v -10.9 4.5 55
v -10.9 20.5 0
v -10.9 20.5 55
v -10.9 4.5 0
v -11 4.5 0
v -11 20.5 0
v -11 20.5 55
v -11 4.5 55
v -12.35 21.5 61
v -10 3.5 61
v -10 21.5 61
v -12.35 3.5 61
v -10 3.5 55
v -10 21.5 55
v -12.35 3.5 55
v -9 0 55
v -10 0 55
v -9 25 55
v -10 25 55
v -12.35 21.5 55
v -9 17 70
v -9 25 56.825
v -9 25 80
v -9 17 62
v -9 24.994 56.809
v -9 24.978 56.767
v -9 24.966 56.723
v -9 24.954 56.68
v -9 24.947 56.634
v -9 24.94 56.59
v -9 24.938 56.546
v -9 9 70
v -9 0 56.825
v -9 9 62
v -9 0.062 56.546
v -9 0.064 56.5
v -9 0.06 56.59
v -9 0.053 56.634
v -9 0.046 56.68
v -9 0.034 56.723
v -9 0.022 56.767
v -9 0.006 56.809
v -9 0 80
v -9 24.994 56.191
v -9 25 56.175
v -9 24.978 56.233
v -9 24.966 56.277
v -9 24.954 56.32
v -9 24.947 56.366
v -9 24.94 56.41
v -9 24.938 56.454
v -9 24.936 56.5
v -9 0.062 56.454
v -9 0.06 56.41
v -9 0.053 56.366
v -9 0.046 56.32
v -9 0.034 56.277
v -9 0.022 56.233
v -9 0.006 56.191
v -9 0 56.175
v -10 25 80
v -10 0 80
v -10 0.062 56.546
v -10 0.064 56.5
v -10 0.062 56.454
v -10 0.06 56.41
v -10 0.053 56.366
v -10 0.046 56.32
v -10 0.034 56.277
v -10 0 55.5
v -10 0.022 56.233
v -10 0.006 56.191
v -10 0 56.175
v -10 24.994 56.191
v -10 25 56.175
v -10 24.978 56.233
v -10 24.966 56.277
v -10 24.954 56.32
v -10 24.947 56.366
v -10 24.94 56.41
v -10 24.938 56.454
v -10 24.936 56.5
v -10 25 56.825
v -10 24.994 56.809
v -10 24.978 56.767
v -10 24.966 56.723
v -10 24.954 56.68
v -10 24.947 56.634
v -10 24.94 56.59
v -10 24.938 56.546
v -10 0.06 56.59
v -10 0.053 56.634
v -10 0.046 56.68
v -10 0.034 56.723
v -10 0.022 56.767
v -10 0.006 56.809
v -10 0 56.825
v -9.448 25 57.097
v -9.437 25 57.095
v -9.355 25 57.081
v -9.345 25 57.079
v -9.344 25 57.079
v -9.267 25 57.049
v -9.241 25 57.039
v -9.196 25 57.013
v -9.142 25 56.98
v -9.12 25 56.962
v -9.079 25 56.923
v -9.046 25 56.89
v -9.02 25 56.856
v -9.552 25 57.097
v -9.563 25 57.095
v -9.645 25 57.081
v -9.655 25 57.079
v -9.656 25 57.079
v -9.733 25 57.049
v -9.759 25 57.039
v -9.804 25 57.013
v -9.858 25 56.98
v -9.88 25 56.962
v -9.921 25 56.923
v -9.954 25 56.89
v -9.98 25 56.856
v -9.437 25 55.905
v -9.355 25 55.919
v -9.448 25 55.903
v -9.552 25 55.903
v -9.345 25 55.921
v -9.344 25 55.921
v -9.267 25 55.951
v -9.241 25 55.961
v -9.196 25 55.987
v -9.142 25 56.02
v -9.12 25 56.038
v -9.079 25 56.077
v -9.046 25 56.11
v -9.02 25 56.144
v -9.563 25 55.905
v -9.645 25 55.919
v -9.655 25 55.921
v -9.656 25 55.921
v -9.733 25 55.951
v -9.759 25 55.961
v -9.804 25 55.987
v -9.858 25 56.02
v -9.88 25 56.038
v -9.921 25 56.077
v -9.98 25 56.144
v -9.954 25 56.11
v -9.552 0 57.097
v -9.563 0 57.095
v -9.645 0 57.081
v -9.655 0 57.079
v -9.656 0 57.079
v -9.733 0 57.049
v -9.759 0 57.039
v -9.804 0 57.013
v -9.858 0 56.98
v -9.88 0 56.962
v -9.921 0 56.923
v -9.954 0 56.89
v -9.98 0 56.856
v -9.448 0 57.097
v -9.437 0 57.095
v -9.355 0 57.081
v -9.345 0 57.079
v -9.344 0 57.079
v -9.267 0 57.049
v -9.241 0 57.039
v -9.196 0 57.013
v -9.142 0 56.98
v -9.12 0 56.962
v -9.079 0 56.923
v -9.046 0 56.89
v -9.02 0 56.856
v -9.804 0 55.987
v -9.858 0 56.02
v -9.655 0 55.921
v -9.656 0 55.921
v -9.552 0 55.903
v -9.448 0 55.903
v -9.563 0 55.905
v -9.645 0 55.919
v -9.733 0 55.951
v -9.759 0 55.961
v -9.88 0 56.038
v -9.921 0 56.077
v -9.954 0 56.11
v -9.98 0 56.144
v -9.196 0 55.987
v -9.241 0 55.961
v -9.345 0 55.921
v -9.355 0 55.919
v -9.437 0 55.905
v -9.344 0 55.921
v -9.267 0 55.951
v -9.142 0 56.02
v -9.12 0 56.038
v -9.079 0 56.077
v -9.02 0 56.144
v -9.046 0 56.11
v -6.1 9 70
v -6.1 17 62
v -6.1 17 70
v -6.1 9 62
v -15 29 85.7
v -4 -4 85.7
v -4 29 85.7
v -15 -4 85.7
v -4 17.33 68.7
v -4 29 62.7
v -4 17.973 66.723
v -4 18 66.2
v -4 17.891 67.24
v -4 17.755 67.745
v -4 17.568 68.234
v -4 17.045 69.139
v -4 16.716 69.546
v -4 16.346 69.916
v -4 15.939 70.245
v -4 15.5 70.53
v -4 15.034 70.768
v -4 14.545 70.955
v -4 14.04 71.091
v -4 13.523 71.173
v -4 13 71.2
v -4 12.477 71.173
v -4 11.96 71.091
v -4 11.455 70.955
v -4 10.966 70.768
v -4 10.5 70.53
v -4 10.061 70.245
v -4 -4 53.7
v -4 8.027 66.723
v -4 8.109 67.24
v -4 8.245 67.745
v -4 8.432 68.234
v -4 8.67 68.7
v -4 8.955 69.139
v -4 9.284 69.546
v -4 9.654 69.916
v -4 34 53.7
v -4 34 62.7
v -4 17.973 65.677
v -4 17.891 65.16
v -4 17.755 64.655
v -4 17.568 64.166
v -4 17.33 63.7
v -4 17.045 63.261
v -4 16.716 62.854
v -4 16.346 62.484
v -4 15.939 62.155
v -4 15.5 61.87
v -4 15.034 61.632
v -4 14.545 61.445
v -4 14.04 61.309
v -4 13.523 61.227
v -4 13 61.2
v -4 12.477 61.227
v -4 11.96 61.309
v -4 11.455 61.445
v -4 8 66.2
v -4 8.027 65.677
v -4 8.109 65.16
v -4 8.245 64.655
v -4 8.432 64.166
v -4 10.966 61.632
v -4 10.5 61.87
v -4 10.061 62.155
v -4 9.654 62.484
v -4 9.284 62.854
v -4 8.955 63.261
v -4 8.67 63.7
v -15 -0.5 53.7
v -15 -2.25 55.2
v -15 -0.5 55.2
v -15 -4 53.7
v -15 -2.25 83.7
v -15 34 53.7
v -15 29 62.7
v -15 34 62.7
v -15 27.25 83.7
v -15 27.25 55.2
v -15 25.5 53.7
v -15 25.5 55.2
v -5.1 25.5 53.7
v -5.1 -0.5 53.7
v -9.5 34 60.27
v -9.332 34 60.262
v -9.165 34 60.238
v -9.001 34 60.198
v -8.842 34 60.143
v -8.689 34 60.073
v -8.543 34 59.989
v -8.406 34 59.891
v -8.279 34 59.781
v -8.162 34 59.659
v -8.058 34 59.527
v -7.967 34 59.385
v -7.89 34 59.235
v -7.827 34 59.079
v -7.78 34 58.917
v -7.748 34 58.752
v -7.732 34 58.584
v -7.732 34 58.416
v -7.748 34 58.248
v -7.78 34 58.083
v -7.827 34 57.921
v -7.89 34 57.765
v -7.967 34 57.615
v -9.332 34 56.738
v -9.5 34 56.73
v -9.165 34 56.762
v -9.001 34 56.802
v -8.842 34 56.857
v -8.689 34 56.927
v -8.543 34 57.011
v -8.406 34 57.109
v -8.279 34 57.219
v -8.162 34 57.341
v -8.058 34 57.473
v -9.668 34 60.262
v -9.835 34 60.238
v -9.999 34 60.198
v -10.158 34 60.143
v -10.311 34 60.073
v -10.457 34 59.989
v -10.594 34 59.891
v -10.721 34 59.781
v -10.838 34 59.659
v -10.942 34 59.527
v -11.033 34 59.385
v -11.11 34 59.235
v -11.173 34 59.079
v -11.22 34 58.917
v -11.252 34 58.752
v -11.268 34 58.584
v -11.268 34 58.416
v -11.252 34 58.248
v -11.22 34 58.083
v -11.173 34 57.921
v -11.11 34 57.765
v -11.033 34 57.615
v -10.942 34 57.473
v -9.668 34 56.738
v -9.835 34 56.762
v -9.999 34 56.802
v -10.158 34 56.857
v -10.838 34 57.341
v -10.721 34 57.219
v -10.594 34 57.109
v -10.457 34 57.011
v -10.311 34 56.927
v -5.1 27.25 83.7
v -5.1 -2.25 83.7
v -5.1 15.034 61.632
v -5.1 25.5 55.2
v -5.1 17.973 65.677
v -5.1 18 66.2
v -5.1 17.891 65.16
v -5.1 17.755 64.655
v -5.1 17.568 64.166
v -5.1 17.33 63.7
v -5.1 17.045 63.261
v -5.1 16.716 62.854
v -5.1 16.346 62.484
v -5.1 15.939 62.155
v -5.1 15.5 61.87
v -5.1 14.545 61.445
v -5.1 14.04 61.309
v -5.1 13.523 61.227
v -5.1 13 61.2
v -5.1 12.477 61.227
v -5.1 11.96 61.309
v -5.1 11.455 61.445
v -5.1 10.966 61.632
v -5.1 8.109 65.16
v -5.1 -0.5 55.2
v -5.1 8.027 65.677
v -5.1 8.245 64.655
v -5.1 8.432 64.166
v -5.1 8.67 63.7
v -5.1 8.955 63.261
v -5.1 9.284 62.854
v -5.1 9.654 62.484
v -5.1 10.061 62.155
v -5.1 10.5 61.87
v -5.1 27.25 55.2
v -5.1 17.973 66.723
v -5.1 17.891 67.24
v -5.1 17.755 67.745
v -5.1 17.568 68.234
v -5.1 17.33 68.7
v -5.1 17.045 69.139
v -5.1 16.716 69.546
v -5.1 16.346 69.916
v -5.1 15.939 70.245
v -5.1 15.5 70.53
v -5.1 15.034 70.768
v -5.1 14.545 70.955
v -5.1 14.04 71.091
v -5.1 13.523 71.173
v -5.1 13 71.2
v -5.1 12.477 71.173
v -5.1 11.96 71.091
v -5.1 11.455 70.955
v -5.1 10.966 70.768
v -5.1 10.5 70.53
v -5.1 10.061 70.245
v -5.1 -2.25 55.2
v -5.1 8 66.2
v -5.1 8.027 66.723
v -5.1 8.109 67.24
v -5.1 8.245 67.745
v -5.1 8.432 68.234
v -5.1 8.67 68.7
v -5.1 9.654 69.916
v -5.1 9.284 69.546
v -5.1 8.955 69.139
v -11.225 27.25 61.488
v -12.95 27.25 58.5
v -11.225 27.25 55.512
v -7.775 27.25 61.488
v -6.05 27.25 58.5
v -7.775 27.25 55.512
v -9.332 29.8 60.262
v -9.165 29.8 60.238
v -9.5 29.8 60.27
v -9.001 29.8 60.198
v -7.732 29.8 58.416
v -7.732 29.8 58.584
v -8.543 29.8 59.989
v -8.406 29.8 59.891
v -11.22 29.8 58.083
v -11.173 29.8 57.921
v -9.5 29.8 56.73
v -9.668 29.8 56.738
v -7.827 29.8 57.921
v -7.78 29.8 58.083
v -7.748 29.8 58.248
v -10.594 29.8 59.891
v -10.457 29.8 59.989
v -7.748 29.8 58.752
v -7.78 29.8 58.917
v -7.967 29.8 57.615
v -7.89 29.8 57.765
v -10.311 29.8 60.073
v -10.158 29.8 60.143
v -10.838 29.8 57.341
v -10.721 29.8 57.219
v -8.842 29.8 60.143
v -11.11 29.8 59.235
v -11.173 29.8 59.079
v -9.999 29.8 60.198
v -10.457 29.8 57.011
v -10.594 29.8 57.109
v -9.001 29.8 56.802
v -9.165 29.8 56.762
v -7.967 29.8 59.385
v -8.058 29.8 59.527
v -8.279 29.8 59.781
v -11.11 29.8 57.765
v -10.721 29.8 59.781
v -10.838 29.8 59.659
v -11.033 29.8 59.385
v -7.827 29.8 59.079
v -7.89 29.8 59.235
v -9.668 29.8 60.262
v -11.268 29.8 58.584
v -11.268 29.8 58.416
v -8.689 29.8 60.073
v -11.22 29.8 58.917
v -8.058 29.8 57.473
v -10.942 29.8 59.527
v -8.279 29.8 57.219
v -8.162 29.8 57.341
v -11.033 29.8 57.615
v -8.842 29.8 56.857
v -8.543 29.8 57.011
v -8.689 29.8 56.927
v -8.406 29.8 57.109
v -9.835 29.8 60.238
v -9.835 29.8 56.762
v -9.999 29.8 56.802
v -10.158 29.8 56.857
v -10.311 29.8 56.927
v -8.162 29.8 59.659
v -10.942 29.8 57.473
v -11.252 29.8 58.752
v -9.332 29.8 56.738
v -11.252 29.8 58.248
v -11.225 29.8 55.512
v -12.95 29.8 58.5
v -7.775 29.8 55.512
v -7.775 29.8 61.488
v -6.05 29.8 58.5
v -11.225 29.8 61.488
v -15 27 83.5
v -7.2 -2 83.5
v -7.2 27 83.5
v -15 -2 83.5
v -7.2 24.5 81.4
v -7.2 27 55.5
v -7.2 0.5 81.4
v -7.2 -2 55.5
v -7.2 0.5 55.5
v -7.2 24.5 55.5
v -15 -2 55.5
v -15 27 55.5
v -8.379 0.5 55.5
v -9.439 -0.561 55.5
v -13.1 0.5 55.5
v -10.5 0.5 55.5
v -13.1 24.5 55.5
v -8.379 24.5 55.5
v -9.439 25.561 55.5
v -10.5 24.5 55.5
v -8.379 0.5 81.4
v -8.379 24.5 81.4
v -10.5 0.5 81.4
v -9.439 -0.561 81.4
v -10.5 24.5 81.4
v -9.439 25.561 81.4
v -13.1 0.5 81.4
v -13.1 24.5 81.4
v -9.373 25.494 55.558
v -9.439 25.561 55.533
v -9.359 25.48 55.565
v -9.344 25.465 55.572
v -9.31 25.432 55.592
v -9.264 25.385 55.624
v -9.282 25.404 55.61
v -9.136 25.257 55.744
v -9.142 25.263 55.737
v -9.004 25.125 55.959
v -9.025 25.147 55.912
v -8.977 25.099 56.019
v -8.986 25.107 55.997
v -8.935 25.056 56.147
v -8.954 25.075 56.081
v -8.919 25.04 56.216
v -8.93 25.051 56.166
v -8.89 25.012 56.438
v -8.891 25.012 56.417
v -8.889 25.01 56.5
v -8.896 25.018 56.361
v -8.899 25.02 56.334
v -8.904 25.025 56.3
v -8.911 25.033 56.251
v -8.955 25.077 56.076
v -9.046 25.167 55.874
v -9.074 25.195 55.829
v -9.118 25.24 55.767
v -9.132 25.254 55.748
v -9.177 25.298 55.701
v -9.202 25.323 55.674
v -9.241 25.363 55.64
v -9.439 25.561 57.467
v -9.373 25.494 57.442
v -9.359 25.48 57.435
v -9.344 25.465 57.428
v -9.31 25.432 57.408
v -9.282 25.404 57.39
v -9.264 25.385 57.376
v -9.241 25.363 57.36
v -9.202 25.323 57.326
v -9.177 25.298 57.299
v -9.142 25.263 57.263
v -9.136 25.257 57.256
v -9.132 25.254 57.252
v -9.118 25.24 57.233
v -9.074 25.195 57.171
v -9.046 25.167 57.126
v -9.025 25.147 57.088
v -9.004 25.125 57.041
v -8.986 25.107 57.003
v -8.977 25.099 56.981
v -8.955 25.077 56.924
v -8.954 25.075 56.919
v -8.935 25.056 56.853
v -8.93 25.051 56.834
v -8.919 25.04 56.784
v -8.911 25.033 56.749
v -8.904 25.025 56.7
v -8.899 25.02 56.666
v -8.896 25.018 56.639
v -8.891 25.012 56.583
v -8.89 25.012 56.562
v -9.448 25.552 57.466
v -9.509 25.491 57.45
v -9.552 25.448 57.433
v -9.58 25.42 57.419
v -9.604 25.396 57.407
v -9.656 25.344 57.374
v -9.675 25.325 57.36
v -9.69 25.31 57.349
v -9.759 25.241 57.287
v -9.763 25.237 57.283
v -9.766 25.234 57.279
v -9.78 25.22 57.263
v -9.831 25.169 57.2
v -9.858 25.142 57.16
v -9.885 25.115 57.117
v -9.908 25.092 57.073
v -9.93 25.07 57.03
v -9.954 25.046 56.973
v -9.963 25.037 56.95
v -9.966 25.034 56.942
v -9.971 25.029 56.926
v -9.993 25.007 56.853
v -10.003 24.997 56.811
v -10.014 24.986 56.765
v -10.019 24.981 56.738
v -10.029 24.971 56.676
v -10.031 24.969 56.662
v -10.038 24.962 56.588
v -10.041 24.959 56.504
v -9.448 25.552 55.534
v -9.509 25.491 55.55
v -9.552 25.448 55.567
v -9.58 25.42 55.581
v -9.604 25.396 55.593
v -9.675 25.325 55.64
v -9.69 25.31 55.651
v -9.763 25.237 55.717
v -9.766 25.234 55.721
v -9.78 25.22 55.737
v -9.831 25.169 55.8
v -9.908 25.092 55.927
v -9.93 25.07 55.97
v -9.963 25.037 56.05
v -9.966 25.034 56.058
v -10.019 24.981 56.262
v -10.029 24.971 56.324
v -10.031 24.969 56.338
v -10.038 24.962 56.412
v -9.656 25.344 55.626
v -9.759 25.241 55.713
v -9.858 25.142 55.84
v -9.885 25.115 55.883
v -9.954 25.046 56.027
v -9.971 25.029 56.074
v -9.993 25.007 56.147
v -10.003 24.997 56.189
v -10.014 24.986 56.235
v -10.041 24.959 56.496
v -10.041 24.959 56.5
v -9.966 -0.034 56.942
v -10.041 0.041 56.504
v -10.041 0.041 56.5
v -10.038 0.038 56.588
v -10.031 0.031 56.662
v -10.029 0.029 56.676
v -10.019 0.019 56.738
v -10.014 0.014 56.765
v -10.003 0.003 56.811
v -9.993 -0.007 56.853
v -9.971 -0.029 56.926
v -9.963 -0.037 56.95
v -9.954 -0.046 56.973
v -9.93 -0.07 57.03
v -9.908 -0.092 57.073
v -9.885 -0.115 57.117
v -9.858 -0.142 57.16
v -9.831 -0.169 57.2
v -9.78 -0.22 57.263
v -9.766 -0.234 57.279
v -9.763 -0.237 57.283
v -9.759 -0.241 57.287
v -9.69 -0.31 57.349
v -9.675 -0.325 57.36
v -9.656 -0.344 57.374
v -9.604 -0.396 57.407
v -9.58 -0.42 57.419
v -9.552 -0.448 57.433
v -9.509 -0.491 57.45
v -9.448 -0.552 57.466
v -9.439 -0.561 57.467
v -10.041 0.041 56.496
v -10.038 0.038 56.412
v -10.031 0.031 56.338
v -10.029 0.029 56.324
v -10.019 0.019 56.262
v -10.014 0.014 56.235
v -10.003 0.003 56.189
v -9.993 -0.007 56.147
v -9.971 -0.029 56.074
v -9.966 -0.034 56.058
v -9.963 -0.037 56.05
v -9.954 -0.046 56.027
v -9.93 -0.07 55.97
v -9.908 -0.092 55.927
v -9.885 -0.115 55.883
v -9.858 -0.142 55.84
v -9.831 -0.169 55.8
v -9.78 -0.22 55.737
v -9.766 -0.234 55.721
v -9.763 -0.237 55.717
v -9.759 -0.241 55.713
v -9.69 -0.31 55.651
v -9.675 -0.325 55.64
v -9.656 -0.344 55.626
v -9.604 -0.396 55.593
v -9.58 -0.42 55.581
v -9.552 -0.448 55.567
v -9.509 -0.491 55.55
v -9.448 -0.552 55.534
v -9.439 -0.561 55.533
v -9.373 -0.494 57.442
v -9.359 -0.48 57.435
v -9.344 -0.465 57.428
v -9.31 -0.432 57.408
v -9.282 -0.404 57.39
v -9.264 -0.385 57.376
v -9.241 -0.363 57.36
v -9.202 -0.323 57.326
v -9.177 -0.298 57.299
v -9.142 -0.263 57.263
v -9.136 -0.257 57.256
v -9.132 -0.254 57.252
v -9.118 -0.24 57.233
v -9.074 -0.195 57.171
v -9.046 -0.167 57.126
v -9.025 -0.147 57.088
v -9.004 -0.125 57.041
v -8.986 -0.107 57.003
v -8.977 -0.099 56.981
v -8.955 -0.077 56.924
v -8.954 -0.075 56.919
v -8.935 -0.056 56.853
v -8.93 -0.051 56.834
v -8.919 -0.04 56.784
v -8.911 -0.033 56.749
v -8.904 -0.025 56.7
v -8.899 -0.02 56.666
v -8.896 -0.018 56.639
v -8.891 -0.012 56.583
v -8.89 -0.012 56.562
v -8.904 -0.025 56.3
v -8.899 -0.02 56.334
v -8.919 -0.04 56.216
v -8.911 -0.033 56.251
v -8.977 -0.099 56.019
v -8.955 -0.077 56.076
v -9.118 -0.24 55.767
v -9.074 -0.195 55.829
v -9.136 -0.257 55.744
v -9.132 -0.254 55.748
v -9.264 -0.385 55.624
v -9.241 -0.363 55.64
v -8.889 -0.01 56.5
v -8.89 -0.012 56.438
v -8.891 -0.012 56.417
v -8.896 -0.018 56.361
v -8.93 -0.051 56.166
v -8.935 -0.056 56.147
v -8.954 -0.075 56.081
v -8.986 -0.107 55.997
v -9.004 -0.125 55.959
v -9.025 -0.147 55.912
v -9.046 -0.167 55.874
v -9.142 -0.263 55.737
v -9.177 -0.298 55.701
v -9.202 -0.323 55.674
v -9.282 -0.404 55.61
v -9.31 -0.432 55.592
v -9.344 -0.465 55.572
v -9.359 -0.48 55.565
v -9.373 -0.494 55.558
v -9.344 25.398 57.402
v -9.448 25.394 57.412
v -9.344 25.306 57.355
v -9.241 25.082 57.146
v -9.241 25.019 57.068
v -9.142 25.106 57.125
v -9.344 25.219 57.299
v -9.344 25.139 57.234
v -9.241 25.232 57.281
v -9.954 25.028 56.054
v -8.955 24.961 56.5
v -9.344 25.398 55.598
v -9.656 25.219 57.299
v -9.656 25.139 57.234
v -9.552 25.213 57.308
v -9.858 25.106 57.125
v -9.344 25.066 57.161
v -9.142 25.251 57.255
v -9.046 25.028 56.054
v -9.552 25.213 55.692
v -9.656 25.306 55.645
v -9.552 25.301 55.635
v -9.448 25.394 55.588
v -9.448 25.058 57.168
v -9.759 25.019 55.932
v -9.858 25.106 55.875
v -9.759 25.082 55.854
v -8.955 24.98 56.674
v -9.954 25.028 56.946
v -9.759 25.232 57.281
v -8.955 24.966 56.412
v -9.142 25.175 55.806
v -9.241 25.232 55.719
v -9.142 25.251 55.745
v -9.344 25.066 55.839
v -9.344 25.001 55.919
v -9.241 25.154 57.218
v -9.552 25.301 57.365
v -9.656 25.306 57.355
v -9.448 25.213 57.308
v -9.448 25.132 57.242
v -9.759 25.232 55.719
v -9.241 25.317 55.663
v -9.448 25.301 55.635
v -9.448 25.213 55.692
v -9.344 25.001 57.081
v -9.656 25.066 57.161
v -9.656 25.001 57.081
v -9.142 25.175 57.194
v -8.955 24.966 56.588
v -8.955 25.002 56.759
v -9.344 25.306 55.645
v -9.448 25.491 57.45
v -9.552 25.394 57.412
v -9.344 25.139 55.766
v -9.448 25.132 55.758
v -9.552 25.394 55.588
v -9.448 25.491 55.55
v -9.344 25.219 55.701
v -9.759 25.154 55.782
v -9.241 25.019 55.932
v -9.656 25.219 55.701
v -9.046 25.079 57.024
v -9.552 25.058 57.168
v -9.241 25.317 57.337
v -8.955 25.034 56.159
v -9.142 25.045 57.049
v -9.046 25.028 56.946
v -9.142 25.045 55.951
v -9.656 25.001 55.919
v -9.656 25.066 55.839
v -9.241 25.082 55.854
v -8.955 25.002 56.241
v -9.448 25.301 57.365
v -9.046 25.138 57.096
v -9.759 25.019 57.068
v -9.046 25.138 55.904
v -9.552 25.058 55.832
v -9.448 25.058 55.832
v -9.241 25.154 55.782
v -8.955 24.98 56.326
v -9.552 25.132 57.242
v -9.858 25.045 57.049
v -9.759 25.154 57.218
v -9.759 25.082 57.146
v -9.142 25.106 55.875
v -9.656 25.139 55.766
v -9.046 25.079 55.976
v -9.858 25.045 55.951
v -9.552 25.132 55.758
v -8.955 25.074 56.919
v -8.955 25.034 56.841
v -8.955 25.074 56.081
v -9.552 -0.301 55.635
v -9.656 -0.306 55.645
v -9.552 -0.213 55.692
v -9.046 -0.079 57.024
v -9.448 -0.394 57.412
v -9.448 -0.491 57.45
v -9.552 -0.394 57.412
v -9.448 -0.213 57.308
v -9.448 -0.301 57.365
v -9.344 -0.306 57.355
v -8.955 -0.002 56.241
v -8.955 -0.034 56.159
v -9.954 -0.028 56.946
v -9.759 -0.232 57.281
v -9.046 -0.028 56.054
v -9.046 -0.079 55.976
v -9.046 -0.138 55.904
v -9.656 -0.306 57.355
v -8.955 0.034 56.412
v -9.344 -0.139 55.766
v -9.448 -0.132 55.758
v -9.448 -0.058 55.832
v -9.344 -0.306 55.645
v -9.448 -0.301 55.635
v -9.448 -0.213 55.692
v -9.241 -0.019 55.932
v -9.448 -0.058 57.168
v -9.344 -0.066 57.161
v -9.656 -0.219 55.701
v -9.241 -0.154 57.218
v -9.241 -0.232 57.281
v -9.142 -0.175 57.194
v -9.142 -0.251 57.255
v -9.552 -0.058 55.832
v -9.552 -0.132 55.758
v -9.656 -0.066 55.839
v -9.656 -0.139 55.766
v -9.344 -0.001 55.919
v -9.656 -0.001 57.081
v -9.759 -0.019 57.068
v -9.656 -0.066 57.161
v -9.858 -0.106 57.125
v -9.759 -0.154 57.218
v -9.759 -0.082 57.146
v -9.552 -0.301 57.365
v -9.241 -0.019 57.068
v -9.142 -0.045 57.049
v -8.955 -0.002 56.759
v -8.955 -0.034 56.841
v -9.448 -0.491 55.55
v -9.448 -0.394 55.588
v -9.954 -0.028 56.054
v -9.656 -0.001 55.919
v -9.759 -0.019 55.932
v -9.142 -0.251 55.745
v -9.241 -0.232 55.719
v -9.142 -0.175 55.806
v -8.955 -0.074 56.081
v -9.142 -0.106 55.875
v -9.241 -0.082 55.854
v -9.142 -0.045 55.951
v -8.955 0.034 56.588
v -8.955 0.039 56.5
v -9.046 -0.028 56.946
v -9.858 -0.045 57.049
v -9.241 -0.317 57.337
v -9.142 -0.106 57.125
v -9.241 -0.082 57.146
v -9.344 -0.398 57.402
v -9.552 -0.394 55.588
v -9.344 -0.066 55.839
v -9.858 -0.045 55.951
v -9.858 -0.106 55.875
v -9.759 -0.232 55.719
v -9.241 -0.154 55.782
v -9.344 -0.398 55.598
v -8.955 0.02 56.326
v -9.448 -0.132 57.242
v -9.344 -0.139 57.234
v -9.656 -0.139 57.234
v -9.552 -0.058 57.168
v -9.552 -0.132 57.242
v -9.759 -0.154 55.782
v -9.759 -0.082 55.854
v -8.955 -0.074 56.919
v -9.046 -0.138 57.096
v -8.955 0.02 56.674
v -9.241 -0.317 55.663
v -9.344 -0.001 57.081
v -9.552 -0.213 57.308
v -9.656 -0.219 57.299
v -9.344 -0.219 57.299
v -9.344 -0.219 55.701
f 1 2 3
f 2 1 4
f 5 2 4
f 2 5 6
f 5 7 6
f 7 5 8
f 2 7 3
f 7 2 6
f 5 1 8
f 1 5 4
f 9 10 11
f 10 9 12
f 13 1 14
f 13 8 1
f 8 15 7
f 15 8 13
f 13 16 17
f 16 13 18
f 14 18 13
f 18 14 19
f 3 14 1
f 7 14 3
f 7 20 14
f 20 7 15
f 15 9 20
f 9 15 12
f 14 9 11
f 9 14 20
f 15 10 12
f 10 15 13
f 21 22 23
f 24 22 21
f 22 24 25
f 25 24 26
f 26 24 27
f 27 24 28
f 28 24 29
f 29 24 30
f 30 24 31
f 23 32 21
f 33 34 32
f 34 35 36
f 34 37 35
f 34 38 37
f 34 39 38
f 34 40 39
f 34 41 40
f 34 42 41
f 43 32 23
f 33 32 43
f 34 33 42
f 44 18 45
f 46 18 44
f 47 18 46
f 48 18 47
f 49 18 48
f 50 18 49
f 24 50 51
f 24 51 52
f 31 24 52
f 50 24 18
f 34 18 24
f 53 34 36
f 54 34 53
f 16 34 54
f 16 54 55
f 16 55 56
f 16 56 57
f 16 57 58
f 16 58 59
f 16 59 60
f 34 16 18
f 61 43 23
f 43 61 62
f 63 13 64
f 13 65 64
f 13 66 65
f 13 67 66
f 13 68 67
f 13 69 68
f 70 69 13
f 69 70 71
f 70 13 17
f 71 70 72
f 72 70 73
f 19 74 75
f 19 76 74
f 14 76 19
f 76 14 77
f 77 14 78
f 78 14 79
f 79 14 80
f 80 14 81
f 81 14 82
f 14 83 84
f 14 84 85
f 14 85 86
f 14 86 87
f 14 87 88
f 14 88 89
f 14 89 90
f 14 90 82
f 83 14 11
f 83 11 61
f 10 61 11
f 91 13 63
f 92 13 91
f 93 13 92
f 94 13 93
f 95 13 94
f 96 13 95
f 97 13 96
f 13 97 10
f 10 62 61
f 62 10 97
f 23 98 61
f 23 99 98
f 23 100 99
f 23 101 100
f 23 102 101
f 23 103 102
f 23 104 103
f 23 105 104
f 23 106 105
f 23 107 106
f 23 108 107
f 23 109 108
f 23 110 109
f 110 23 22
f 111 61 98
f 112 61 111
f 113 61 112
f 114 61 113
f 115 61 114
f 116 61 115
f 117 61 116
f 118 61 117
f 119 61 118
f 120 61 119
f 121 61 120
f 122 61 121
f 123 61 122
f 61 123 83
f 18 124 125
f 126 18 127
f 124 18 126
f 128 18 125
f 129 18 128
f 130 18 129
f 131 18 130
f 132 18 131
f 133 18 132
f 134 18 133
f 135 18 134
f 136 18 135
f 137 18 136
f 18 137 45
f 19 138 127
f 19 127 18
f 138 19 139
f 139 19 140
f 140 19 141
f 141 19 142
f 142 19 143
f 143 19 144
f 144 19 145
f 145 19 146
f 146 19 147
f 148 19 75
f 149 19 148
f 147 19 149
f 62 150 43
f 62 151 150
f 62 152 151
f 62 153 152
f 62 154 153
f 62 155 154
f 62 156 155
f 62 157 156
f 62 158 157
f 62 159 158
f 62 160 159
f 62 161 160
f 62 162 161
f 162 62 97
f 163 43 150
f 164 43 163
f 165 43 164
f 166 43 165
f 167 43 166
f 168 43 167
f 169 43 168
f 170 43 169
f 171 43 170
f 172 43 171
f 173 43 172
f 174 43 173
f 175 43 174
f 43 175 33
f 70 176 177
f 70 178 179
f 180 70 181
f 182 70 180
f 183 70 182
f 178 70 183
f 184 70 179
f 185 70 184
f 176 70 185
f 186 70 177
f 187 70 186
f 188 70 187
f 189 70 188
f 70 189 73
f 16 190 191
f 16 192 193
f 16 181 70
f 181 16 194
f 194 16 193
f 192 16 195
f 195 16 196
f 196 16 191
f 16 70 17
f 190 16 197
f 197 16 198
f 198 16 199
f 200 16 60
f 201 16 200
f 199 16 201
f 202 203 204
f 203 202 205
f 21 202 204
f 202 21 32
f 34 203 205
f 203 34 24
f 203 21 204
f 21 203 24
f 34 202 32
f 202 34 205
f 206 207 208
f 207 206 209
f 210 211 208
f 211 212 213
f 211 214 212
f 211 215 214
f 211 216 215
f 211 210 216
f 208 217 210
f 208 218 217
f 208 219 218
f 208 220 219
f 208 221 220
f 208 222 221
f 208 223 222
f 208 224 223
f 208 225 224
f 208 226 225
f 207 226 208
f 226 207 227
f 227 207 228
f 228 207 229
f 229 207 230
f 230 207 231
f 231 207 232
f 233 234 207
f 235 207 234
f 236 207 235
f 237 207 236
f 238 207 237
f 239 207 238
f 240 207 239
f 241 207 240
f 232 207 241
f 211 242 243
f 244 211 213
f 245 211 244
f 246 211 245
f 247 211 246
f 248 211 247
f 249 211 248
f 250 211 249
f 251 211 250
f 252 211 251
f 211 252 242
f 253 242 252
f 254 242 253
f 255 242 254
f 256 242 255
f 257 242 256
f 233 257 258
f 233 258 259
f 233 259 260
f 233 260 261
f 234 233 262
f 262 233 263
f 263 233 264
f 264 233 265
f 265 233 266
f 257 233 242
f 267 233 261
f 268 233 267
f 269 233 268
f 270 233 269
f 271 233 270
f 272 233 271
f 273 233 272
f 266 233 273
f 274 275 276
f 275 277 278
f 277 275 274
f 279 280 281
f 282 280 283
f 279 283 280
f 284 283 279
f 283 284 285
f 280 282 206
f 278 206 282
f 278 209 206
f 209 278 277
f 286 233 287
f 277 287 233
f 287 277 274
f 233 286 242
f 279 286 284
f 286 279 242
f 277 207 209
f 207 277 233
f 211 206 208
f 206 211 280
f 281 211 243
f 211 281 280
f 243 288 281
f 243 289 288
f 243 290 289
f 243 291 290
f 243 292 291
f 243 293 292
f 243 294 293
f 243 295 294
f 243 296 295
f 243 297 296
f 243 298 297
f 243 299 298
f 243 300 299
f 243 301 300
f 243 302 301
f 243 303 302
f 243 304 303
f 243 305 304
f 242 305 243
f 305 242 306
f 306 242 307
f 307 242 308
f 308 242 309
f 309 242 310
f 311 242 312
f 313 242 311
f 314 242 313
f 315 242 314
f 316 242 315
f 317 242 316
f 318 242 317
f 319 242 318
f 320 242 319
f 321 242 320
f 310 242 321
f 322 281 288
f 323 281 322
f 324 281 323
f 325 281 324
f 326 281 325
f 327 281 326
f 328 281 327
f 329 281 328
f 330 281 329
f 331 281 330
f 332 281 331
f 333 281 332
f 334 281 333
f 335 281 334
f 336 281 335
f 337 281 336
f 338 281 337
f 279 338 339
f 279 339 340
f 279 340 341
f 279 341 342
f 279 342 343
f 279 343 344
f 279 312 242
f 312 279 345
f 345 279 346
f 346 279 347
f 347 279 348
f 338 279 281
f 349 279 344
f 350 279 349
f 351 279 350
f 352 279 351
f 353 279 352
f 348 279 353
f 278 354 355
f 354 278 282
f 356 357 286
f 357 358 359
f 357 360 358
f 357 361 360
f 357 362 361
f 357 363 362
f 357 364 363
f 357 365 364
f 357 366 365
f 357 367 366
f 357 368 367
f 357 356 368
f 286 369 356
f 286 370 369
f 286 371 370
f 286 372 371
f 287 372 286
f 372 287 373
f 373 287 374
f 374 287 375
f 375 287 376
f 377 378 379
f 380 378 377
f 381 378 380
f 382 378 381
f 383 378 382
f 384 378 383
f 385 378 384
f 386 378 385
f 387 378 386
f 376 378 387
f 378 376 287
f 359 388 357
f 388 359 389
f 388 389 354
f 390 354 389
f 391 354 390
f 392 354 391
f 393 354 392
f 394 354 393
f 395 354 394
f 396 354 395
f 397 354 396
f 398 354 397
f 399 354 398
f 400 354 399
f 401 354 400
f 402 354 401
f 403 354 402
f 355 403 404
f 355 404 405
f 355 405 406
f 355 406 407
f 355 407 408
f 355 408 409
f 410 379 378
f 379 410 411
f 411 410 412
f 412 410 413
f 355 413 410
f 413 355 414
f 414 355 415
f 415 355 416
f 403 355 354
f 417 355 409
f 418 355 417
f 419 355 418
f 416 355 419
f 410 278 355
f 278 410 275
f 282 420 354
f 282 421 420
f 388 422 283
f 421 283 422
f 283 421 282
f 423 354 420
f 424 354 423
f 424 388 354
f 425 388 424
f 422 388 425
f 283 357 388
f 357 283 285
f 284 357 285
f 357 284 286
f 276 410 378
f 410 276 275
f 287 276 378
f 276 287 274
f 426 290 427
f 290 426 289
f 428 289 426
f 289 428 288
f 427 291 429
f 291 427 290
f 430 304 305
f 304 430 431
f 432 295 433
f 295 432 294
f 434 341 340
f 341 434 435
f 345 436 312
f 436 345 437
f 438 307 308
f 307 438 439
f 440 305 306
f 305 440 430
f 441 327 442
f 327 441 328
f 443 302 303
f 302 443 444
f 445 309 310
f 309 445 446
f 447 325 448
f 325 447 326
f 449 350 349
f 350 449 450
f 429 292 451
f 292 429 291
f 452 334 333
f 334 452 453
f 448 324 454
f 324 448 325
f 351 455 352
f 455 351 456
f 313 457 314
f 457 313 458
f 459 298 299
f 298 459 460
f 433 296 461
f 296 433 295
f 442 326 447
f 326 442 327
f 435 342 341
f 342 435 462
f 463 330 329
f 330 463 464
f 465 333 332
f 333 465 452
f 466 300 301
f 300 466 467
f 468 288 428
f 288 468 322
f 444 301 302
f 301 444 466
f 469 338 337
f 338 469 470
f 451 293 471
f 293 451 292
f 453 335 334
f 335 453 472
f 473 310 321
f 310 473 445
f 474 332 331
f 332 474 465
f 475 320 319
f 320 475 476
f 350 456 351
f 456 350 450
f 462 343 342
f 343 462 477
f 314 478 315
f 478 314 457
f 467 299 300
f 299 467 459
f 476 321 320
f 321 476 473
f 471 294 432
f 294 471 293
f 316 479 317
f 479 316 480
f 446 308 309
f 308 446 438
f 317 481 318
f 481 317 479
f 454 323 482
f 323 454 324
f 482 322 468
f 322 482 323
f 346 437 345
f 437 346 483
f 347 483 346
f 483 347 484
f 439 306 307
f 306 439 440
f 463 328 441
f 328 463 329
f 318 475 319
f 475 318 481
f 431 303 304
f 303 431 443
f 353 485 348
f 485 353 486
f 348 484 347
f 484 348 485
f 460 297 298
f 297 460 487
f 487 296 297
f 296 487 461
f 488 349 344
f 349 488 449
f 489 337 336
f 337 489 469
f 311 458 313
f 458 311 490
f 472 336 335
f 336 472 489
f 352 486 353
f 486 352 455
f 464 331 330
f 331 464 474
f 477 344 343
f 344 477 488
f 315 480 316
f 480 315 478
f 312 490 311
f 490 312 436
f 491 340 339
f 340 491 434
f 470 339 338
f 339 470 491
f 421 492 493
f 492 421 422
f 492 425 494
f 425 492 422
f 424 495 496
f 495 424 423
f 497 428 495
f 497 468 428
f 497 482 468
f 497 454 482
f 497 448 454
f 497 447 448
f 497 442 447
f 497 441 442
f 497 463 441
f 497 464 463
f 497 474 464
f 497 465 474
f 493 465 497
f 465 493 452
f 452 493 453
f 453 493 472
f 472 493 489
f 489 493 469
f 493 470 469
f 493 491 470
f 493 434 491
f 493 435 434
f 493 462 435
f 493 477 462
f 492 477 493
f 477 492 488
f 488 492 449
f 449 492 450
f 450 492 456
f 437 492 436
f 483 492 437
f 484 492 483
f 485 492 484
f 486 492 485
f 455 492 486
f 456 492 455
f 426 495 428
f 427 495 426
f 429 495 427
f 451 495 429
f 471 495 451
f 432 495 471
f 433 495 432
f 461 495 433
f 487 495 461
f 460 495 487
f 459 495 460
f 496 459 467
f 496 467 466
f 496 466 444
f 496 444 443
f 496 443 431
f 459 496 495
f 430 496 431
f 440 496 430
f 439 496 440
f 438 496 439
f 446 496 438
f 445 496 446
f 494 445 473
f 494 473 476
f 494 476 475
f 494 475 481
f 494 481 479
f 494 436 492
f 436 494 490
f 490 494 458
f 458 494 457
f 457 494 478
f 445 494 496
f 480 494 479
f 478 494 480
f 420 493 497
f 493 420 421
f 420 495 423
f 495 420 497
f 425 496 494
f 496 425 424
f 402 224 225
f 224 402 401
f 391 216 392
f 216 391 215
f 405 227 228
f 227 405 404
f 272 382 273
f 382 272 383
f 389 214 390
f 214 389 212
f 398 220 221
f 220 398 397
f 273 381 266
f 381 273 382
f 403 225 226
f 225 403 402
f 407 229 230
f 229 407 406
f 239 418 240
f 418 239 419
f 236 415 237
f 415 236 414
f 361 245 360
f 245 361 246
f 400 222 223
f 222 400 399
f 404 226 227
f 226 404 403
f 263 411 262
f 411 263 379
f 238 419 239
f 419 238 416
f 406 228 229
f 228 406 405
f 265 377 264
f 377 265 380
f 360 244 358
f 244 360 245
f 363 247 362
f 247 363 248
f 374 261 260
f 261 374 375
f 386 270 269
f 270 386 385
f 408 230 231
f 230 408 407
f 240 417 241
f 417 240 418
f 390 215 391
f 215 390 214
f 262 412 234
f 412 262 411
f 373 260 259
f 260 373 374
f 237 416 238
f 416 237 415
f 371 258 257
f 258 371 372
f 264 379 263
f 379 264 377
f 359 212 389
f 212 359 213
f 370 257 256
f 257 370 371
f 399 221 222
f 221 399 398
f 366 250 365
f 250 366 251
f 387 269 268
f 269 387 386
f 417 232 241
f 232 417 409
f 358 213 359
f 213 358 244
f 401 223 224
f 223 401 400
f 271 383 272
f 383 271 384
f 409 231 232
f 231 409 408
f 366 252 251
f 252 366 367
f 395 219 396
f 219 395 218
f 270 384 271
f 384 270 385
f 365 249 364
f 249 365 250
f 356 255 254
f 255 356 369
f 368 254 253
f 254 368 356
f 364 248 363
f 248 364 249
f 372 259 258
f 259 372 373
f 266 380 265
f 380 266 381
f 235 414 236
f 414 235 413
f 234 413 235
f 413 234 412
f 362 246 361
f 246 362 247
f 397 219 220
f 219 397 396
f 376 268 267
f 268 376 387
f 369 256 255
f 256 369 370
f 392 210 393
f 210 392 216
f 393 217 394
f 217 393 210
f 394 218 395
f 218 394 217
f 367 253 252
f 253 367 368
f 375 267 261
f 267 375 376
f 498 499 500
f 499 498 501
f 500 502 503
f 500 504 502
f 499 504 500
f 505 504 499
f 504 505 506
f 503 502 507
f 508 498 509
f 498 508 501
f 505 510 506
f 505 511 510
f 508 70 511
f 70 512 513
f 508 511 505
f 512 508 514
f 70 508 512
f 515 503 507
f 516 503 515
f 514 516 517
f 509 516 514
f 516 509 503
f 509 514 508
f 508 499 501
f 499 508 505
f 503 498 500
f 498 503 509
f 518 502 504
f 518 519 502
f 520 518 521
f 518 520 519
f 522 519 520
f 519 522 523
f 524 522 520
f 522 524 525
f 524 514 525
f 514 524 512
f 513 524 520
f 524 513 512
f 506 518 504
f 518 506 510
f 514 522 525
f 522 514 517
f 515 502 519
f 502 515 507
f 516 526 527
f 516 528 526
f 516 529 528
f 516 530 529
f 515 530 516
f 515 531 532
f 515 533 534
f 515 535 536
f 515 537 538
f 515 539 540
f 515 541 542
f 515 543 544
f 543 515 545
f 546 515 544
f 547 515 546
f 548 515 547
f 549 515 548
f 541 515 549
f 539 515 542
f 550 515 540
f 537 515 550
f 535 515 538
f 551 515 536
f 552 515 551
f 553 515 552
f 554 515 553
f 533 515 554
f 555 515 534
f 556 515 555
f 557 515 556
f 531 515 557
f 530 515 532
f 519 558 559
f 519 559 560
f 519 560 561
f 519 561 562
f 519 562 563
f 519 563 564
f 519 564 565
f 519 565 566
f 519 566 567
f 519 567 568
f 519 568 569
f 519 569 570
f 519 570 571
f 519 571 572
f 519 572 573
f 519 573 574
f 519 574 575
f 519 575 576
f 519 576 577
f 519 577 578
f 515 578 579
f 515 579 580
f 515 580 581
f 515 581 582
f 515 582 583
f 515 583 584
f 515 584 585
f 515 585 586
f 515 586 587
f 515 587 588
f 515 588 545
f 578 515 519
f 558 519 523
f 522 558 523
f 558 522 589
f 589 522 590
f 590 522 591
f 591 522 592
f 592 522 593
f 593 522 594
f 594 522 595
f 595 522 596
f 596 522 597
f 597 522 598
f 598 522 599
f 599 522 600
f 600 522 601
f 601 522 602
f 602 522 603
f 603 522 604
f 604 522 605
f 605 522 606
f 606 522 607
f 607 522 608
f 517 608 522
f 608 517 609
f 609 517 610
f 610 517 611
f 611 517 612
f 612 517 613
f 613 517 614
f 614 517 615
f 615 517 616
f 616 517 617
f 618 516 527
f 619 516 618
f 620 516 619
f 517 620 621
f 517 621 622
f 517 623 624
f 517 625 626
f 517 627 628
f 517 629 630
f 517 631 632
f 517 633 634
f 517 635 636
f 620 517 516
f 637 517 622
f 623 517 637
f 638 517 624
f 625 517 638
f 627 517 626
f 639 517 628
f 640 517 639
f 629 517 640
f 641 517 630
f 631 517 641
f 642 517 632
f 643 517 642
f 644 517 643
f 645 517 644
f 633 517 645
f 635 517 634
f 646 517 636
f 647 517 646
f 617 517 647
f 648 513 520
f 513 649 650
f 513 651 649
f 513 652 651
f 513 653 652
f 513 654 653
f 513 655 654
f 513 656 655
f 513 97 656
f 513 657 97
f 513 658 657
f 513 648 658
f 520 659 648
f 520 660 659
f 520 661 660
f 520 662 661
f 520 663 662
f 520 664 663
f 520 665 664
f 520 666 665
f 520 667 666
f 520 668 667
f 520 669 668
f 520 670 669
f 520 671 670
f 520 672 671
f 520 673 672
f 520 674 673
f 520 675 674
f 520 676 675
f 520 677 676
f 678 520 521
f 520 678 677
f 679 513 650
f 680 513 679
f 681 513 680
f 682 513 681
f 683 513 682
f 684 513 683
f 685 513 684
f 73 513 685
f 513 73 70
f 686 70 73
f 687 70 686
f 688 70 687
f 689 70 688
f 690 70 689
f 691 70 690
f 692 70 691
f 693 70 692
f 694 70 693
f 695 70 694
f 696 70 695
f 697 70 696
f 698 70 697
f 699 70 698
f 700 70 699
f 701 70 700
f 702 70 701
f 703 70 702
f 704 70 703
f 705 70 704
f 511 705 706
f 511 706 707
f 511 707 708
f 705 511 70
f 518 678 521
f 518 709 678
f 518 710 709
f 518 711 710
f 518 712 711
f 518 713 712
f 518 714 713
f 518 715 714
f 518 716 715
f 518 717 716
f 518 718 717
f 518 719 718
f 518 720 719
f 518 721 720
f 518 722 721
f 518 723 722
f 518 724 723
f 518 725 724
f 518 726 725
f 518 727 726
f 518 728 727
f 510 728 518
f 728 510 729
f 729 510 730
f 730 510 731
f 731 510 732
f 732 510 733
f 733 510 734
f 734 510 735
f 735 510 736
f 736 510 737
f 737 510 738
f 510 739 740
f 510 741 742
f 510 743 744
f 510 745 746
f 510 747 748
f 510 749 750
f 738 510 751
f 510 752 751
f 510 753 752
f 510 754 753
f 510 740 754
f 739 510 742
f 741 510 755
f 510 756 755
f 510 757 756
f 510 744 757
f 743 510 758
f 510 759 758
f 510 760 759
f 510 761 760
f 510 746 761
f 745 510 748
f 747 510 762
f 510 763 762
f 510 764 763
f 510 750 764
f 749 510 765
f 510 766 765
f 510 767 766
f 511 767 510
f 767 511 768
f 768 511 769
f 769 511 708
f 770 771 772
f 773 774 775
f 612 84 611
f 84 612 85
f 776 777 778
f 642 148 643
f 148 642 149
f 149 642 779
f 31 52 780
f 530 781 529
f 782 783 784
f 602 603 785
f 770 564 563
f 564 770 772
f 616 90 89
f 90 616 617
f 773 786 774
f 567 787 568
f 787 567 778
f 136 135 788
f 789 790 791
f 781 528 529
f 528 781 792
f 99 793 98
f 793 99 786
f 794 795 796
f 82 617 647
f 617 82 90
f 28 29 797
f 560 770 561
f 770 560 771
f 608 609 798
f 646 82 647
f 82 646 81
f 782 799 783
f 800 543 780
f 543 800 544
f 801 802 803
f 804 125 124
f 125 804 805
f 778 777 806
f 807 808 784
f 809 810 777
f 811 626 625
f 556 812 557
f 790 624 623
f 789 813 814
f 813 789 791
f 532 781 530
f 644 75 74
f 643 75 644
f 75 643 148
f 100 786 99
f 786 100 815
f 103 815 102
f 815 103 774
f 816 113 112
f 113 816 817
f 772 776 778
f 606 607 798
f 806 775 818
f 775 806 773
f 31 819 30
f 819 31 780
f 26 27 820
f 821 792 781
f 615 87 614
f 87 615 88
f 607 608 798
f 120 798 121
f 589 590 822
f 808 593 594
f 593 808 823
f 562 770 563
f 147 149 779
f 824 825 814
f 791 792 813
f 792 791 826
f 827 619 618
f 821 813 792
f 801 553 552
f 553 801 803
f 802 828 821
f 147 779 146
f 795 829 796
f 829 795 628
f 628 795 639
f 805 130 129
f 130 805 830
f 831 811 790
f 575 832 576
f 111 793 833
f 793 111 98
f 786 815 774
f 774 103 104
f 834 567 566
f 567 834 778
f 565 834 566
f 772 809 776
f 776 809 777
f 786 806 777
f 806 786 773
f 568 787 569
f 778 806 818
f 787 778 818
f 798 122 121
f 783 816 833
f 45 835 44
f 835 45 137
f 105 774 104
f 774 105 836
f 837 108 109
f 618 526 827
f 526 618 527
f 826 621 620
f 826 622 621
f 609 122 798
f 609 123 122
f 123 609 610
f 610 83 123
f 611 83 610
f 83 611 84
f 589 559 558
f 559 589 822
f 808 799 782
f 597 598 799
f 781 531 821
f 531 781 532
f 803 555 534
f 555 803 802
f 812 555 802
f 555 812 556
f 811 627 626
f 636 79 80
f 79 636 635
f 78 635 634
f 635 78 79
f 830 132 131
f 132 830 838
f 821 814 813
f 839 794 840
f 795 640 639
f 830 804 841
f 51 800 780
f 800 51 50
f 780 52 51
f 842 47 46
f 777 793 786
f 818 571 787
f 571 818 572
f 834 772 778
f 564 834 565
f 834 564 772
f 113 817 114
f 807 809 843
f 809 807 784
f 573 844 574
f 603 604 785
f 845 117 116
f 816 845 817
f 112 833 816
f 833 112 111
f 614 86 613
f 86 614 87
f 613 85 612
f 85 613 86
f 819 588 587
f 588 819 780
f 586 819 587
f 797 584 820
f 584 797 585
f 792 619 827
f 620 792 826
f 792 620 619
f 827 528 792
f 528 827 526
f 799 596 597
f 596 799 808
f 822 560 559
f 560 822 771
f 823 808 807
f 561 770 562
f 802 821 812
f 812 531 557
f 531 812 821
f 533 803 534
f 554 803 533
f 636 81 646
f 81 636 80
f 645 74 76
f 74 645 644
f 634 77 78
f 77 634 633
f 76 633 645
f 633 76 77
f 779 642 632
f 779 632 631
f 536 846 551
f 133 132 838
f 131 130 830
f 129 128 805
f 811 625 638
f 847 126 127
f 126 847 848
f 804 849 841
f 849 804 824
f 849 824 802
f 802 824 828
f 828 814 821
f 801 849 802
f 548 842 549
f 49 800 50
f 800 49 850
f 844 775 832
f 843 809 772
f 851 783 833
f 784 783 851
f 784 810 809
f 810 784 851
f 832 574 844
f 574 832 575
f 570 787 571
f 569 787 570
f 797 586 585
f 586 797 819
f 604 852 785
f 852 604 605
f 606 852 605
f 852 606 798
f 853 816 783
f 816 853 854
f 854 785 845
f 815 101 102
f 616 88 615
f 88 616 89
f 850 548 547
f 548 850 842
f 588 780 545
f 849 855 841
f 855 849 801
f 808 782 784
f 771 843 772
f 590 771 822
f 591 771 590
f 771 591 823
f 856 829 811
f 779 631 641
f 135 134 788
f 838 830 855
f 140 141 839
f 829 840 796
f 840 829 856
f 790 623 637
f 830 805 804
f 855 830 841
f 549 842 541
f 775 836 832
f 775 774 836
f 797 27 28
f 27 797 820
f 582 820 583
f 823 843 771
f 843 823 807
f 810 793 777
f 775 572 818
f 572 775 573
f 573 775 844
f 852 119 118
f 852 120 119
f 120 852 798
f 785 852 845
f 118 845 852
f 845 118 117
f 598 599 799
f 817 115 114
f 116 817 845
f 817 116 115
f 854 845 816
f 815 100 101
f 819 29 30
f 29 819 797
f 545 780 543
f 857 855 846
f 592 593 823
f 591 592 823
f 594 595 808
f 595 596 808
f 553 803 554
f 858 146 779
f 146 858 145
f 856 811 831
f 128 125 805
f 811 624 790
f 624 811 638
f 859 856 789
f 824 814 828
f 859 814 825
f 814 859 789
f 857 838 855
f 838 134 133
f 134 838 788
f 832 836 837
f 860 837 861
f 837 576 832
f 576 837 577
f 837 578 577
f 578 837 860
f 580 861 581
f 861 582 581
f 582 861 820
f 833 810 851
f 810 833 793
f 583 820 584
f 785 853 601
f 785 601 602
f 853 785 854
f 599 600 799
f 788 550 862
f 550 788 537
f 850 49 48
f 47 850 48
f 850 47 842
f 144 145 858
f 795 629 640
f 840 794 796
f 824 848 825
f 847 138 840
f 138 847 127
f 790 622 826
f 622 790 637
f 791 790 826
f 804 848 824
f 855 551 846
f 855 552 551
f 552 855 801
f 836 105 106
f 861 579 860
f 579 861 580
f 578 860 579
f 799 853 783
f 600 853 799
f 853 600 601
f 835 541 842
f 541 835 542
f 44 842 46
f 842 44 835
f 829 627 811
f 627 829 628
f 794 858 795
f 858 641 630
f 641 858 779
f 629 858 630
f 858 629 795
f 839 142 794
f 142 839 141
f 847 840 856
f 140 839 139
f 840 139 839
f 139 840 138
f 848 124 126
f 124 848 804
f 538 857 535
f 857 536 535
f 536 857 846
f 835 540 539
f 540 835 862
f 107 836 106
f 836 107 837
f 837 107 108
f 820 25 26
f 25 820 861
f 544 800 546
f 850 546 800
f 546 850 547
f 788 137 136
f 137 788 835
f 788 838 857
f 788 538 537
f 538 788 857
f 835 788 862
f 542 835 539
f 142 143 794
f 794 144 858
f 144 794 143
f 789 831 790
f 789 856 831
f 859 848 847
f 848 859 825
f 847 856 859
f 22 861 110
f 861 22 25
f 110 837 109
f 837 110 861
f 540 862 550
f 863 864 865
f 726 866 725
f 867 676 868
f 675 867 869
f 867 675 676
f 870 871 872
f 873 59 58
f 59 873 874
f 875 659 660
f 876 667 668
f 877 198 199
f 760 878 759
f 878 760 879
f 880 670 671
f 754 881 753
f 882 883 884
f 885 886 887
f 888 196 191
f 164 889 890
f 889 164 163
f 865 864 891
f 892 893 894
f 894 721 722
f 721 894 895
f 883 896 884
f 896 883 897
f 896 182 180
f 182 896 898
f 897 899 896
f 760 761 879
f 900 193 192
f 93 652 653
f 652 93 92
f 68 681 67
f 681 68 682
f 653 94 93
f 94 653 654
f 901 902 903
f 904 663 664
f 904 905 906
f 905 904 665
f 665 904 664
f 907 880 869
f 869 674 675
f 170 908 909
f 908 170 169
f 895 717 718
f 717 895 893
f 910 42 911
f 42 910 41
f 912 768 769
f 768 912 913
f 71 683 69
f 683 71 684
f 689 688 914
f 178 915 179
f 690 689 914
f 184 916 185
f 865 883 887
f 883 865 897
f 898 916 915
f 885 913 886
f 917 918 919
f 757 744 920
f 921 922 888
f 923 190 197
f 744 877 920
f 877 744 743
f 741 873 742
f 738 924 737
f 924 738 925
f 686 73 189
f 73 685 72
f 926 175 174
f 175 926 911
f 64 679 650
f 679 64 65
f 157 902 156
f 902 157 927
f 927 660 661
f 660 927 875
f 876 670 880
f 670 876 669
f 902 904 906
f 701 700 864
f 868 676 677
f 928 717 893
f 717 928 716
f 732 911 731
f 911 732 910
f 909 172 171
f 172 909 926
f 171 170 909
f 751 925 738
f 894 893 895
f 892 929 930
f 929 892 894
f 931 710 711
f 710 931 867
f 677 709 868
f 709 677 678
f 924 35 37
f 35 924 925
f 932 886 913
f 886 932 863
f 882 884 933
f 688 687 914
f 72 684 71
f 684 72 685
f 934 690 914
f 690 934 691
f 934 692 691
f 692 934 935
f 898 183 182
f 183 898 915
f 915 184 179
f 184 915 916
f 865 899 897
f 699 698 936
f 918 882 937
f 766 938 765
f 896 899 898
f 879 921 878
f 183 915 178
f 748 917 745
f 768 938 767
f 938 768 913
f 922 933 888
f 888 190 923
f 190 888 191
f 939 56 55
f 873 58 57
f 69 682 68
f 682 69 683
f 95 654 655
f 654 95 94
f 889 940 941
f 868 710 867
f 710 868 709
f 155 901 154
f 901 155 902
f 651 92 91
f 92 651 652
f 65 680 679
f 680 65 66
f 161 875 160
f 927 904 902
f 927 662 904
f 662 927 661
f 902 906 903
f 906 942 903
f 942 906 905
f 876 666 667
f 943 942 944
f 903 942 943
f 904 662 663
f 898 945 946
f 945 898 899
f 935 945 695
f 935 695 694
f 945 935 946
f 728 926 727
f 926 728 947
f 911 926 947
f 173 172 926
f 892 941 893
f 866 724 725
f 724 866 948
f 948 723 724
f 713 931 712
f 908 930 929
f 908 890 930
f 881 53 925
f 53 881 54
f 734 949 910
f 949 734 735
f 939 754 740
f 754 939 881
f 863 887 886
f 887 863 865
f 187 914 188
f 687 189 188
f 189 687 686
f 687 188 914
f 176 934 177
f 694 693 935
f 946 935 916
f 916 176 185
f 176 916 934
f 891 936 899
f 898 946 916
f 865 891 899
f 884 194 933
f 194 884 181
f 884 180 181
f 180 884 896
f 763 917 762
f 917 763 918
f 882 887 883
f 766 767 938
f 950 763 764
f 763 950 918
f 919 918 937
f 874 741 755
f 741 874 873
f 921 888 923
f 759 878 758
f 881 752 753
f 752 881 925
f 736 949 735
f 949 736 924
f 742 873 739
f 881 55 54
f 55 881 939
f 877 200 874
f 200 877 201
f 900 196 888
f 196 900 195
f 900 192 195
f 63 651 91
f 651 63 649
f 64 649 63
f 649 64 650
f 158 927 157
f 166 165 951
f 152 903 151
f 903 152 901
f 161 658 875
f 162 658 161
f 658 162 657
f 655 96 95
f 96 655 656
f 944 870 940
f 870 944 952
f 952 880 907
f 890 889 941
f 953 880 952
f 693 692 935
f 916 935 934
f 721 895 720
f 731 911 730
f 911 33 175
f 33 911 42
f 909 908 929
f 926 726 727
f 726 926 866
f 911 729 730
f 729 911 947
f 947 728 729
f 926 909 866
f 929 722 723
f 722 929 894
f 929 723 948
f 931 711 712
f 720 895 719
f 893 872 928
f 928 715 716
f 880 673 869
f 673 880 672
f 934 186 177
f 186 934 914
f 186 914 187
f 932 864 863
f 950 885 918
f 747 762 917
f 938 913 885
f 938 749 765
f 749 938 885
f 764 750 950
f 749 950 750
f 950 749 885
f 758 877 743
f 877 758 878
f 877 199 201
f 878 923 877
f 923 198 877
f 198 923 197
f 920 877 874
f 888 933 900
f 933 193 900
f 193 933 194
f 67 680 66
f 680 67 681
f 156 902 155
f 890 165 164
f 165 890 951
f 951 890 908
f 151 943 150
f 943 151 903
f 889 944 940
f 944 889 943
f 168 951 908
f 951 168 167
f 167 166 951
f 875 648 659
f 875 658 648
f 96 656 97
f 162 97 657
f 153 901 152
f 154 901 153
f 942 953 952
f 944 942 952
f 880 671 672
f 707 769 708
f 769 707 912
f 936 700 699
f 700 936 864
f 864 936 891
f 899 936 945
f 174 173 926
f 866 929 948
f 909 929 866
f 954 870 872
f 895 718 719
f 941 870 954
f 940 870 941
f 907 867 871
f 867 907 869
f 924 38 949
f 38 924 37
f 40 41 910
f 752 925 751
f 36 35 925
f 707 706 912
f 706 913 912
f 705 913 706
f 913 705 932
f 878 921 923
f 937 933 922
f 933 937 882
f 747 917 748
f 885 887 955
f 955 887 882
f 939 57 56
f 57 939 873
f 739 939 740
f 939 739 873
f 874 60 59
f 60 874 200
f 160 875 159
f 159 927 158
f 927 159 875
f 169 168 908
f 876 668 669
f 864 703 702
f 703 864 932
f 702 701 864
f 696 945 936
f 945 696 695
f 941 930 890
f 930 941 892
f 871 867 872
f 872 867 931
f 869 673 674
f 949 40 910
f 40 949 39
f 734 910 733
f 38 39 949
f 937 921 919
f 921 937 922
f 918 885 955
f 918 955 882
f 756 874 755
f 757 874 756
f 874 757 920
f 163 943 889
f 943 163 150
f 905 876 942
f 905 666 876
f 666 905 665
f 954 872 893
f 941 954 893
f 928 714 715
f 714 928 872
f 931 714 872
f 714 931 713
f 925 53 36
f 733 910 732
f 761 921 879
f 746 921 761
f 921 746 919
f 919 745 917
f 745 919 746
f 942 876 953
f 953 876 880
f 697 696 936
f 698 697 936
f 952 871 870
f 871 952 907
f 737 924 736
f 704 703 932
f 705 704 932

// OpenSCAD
default_schrauben_abstand = 20;
default_schrauben_radius=1.77;
default_schrauben_hoehe=16;
default_schrauben_z = -1;
default_schrauben_elemente=66;

module schraube(x, y, z, radius, hoehe){	
	color("lightgreen")
		translate([x, y, z])
			cylinder(r=radius, h=hoehe, $fn=default_schrauben_elemente);
}

function schrauben_abstand(position) = position + default_schrauben_abstand;

module schrauben(x, y, z, r, h){
	schraube(x, y, z, r, h);
	schraube(x, schrauben_abstand(y), z, r, h);
}


// **********************************************
//                                  Enviroment
// **********************************************

module cam_cable(){
	color("white")
		cube([0.1,16,60]);
	
	color("brown")
			translate([-1.35, -1, 55])
			cube([2.7,18,6]);
}

module cam(){
	translate([-10, 0, 55])
	union() {
		color("green")
			translate([0, 0, 0])
			cube([1,25,25]);
		color("black")
			translate([0.9, 9, 7])
			cube([3,8,8]);
		
		translate([-1, 4.5, -55])
			cam_cable();
		}
}


// **********************************************
//                                  Objects
// **********************************************
$fn=60;
module cam_base() {
	color("lightgreen")
	difference() {
		union() {
			cube([15,25,11]);
			
			translate([7.5,10,18])
				rotate([-90,0,0])
					union() {
						cylinder(r=7.5,h=5, center=false);
						translate([-7.5,0,0])cube([15,10,5]);
					}
		}		
		hull() {
			schraube(7.5, 2.5, 7.5, 3.4, 5);
			schraube(7.5, 0, 7.5, 3.4, 5);
		}
		hull() {
			schraube(7.5, 22.5, 7.5, 3.4, 5);
			schraube(7.5, 25, 7.5, 3.4, 5);
		}
		hull() {
			schraube(7.5, 2.5, -4, default_schrauben_radius, 15);
			schraube(7.5, 0, -4, default_schrauben_radius, 15);
			
		}
		hull() {
			schraube(7.5, 22.5, -4, default_schrauben_radius, 15);
			schraube(7.5, 25, -4, default_schrauben_radius, 15);
		}
		rotate([90,0,0])
			schraube(7.5, 18.5, -20, default_schrauben_radius, 15);
	}
}

module cam_arm() {
	rotate([90,0,0])
		difference() {
			hull() {
				cylinder(r=5, h=5);
				translate([0,20,0])
					cylinder(r=5, h=5);
			}		
			schrauben(0,0,-2, default_schrauben_radius, 9);
			
			translate([0,0,-0.1])cylinder(r=3.5,h=2.6, $fn=6);
			translate([0,20,-0.1])cylinder(r=3.5,h=2.6, $fn=6);
		}
}

module cam_arm_handles() {
	translate([7.5,10,18.5])cam_arm();
	translate([7.5,20,18.5])cam_arm();	
	translate([7.5,15,38.5])cam_arm();
}


module cam_case_back() {
	translate([-15, 27, 55.5])
		rotate([180,-90,0])		
			union() {
				difference() {
					cube([28, 29, 7.8]);
					
					translate([-0.1, 2.5, 1.9])
						cube([26, 24, 6]);
						
					translate([-0.1,2.5,4.5])
						rotate([45,0,0])
							cube([26, 1.5, 1.5]);
							
					translate([-0.1,26.5,4.5])
						rotate([45,0,0])
							cube([26, 1.5, 1.5]);
							
					
				}
				translate([1,1.2,5.5])sphere(1);
				translate([1,27.8,5.5])sphere(1);
			}
}

module cam_case_front() {
	translate([-15,29,53.7])
		rotate([180,-90,0])
			union() {
				difference() {
					union() {
						cube([32, 33, 11]);
						
						
						
						translate([0,-5.0,0]) cube([9,5,11]);
							
					}
					rotate([90,0,0])schraube(4.8,5.5,-1.8,default_schrauben_radius, 10);
					rotate([90,90,0])translate([-5.5,4.8,-1.8])cylinder(r=3.45,h=2.6, $fn=6);
				
					difference() {
						translate([-0.1, 1.75, -0.1])
							cube([30.1, 29.5, 10]);
							
						translate([0,0,-1])cube([1.5,3.5,11]);
						translate([0,29.5,-1])cube([1.5,3.5,11]);
					}
							
					translate([12.5,16,8])
						cylinder(r=5, h=4);
				}
				
			}
}

module cam_case() {
	cam();
	cam_case_front();
	cam_case_back();
}


module cam_holder() {
	cam_base();
	color("lightblue")
		cam_arm_handles();
	translate([17,-24.5,0])cam_case();
}


// **********************************************
//                                  Built it
// **********************************************
// Layouts:
//
//  	cam_base
//
//		cam_arm
//		cam_arm_handles
//
//		cam_case_front
//		cam_case_back
//		cam_case
//		
//		dev
// 	
//**********************************************
Layout="cam_case";

if(Layout=="cam_base") {
	cam_base();
}

if(Layout=="cam_arm_handles") {
	cam_arm_handles();
}
if(Layout=="cam_arm") {
	cam_arm();
}

if(Layout=="cam_case") {
	cam_case();
}
if(Layout=="cam_case_front") {
	cam_case_front();
}
if(Layout=="cam_case_back") {
	cam_case_back();
}

if(Layout=="cam") {
	cam();
}

if(Layout=="dev") {
	cam_holder();
}
